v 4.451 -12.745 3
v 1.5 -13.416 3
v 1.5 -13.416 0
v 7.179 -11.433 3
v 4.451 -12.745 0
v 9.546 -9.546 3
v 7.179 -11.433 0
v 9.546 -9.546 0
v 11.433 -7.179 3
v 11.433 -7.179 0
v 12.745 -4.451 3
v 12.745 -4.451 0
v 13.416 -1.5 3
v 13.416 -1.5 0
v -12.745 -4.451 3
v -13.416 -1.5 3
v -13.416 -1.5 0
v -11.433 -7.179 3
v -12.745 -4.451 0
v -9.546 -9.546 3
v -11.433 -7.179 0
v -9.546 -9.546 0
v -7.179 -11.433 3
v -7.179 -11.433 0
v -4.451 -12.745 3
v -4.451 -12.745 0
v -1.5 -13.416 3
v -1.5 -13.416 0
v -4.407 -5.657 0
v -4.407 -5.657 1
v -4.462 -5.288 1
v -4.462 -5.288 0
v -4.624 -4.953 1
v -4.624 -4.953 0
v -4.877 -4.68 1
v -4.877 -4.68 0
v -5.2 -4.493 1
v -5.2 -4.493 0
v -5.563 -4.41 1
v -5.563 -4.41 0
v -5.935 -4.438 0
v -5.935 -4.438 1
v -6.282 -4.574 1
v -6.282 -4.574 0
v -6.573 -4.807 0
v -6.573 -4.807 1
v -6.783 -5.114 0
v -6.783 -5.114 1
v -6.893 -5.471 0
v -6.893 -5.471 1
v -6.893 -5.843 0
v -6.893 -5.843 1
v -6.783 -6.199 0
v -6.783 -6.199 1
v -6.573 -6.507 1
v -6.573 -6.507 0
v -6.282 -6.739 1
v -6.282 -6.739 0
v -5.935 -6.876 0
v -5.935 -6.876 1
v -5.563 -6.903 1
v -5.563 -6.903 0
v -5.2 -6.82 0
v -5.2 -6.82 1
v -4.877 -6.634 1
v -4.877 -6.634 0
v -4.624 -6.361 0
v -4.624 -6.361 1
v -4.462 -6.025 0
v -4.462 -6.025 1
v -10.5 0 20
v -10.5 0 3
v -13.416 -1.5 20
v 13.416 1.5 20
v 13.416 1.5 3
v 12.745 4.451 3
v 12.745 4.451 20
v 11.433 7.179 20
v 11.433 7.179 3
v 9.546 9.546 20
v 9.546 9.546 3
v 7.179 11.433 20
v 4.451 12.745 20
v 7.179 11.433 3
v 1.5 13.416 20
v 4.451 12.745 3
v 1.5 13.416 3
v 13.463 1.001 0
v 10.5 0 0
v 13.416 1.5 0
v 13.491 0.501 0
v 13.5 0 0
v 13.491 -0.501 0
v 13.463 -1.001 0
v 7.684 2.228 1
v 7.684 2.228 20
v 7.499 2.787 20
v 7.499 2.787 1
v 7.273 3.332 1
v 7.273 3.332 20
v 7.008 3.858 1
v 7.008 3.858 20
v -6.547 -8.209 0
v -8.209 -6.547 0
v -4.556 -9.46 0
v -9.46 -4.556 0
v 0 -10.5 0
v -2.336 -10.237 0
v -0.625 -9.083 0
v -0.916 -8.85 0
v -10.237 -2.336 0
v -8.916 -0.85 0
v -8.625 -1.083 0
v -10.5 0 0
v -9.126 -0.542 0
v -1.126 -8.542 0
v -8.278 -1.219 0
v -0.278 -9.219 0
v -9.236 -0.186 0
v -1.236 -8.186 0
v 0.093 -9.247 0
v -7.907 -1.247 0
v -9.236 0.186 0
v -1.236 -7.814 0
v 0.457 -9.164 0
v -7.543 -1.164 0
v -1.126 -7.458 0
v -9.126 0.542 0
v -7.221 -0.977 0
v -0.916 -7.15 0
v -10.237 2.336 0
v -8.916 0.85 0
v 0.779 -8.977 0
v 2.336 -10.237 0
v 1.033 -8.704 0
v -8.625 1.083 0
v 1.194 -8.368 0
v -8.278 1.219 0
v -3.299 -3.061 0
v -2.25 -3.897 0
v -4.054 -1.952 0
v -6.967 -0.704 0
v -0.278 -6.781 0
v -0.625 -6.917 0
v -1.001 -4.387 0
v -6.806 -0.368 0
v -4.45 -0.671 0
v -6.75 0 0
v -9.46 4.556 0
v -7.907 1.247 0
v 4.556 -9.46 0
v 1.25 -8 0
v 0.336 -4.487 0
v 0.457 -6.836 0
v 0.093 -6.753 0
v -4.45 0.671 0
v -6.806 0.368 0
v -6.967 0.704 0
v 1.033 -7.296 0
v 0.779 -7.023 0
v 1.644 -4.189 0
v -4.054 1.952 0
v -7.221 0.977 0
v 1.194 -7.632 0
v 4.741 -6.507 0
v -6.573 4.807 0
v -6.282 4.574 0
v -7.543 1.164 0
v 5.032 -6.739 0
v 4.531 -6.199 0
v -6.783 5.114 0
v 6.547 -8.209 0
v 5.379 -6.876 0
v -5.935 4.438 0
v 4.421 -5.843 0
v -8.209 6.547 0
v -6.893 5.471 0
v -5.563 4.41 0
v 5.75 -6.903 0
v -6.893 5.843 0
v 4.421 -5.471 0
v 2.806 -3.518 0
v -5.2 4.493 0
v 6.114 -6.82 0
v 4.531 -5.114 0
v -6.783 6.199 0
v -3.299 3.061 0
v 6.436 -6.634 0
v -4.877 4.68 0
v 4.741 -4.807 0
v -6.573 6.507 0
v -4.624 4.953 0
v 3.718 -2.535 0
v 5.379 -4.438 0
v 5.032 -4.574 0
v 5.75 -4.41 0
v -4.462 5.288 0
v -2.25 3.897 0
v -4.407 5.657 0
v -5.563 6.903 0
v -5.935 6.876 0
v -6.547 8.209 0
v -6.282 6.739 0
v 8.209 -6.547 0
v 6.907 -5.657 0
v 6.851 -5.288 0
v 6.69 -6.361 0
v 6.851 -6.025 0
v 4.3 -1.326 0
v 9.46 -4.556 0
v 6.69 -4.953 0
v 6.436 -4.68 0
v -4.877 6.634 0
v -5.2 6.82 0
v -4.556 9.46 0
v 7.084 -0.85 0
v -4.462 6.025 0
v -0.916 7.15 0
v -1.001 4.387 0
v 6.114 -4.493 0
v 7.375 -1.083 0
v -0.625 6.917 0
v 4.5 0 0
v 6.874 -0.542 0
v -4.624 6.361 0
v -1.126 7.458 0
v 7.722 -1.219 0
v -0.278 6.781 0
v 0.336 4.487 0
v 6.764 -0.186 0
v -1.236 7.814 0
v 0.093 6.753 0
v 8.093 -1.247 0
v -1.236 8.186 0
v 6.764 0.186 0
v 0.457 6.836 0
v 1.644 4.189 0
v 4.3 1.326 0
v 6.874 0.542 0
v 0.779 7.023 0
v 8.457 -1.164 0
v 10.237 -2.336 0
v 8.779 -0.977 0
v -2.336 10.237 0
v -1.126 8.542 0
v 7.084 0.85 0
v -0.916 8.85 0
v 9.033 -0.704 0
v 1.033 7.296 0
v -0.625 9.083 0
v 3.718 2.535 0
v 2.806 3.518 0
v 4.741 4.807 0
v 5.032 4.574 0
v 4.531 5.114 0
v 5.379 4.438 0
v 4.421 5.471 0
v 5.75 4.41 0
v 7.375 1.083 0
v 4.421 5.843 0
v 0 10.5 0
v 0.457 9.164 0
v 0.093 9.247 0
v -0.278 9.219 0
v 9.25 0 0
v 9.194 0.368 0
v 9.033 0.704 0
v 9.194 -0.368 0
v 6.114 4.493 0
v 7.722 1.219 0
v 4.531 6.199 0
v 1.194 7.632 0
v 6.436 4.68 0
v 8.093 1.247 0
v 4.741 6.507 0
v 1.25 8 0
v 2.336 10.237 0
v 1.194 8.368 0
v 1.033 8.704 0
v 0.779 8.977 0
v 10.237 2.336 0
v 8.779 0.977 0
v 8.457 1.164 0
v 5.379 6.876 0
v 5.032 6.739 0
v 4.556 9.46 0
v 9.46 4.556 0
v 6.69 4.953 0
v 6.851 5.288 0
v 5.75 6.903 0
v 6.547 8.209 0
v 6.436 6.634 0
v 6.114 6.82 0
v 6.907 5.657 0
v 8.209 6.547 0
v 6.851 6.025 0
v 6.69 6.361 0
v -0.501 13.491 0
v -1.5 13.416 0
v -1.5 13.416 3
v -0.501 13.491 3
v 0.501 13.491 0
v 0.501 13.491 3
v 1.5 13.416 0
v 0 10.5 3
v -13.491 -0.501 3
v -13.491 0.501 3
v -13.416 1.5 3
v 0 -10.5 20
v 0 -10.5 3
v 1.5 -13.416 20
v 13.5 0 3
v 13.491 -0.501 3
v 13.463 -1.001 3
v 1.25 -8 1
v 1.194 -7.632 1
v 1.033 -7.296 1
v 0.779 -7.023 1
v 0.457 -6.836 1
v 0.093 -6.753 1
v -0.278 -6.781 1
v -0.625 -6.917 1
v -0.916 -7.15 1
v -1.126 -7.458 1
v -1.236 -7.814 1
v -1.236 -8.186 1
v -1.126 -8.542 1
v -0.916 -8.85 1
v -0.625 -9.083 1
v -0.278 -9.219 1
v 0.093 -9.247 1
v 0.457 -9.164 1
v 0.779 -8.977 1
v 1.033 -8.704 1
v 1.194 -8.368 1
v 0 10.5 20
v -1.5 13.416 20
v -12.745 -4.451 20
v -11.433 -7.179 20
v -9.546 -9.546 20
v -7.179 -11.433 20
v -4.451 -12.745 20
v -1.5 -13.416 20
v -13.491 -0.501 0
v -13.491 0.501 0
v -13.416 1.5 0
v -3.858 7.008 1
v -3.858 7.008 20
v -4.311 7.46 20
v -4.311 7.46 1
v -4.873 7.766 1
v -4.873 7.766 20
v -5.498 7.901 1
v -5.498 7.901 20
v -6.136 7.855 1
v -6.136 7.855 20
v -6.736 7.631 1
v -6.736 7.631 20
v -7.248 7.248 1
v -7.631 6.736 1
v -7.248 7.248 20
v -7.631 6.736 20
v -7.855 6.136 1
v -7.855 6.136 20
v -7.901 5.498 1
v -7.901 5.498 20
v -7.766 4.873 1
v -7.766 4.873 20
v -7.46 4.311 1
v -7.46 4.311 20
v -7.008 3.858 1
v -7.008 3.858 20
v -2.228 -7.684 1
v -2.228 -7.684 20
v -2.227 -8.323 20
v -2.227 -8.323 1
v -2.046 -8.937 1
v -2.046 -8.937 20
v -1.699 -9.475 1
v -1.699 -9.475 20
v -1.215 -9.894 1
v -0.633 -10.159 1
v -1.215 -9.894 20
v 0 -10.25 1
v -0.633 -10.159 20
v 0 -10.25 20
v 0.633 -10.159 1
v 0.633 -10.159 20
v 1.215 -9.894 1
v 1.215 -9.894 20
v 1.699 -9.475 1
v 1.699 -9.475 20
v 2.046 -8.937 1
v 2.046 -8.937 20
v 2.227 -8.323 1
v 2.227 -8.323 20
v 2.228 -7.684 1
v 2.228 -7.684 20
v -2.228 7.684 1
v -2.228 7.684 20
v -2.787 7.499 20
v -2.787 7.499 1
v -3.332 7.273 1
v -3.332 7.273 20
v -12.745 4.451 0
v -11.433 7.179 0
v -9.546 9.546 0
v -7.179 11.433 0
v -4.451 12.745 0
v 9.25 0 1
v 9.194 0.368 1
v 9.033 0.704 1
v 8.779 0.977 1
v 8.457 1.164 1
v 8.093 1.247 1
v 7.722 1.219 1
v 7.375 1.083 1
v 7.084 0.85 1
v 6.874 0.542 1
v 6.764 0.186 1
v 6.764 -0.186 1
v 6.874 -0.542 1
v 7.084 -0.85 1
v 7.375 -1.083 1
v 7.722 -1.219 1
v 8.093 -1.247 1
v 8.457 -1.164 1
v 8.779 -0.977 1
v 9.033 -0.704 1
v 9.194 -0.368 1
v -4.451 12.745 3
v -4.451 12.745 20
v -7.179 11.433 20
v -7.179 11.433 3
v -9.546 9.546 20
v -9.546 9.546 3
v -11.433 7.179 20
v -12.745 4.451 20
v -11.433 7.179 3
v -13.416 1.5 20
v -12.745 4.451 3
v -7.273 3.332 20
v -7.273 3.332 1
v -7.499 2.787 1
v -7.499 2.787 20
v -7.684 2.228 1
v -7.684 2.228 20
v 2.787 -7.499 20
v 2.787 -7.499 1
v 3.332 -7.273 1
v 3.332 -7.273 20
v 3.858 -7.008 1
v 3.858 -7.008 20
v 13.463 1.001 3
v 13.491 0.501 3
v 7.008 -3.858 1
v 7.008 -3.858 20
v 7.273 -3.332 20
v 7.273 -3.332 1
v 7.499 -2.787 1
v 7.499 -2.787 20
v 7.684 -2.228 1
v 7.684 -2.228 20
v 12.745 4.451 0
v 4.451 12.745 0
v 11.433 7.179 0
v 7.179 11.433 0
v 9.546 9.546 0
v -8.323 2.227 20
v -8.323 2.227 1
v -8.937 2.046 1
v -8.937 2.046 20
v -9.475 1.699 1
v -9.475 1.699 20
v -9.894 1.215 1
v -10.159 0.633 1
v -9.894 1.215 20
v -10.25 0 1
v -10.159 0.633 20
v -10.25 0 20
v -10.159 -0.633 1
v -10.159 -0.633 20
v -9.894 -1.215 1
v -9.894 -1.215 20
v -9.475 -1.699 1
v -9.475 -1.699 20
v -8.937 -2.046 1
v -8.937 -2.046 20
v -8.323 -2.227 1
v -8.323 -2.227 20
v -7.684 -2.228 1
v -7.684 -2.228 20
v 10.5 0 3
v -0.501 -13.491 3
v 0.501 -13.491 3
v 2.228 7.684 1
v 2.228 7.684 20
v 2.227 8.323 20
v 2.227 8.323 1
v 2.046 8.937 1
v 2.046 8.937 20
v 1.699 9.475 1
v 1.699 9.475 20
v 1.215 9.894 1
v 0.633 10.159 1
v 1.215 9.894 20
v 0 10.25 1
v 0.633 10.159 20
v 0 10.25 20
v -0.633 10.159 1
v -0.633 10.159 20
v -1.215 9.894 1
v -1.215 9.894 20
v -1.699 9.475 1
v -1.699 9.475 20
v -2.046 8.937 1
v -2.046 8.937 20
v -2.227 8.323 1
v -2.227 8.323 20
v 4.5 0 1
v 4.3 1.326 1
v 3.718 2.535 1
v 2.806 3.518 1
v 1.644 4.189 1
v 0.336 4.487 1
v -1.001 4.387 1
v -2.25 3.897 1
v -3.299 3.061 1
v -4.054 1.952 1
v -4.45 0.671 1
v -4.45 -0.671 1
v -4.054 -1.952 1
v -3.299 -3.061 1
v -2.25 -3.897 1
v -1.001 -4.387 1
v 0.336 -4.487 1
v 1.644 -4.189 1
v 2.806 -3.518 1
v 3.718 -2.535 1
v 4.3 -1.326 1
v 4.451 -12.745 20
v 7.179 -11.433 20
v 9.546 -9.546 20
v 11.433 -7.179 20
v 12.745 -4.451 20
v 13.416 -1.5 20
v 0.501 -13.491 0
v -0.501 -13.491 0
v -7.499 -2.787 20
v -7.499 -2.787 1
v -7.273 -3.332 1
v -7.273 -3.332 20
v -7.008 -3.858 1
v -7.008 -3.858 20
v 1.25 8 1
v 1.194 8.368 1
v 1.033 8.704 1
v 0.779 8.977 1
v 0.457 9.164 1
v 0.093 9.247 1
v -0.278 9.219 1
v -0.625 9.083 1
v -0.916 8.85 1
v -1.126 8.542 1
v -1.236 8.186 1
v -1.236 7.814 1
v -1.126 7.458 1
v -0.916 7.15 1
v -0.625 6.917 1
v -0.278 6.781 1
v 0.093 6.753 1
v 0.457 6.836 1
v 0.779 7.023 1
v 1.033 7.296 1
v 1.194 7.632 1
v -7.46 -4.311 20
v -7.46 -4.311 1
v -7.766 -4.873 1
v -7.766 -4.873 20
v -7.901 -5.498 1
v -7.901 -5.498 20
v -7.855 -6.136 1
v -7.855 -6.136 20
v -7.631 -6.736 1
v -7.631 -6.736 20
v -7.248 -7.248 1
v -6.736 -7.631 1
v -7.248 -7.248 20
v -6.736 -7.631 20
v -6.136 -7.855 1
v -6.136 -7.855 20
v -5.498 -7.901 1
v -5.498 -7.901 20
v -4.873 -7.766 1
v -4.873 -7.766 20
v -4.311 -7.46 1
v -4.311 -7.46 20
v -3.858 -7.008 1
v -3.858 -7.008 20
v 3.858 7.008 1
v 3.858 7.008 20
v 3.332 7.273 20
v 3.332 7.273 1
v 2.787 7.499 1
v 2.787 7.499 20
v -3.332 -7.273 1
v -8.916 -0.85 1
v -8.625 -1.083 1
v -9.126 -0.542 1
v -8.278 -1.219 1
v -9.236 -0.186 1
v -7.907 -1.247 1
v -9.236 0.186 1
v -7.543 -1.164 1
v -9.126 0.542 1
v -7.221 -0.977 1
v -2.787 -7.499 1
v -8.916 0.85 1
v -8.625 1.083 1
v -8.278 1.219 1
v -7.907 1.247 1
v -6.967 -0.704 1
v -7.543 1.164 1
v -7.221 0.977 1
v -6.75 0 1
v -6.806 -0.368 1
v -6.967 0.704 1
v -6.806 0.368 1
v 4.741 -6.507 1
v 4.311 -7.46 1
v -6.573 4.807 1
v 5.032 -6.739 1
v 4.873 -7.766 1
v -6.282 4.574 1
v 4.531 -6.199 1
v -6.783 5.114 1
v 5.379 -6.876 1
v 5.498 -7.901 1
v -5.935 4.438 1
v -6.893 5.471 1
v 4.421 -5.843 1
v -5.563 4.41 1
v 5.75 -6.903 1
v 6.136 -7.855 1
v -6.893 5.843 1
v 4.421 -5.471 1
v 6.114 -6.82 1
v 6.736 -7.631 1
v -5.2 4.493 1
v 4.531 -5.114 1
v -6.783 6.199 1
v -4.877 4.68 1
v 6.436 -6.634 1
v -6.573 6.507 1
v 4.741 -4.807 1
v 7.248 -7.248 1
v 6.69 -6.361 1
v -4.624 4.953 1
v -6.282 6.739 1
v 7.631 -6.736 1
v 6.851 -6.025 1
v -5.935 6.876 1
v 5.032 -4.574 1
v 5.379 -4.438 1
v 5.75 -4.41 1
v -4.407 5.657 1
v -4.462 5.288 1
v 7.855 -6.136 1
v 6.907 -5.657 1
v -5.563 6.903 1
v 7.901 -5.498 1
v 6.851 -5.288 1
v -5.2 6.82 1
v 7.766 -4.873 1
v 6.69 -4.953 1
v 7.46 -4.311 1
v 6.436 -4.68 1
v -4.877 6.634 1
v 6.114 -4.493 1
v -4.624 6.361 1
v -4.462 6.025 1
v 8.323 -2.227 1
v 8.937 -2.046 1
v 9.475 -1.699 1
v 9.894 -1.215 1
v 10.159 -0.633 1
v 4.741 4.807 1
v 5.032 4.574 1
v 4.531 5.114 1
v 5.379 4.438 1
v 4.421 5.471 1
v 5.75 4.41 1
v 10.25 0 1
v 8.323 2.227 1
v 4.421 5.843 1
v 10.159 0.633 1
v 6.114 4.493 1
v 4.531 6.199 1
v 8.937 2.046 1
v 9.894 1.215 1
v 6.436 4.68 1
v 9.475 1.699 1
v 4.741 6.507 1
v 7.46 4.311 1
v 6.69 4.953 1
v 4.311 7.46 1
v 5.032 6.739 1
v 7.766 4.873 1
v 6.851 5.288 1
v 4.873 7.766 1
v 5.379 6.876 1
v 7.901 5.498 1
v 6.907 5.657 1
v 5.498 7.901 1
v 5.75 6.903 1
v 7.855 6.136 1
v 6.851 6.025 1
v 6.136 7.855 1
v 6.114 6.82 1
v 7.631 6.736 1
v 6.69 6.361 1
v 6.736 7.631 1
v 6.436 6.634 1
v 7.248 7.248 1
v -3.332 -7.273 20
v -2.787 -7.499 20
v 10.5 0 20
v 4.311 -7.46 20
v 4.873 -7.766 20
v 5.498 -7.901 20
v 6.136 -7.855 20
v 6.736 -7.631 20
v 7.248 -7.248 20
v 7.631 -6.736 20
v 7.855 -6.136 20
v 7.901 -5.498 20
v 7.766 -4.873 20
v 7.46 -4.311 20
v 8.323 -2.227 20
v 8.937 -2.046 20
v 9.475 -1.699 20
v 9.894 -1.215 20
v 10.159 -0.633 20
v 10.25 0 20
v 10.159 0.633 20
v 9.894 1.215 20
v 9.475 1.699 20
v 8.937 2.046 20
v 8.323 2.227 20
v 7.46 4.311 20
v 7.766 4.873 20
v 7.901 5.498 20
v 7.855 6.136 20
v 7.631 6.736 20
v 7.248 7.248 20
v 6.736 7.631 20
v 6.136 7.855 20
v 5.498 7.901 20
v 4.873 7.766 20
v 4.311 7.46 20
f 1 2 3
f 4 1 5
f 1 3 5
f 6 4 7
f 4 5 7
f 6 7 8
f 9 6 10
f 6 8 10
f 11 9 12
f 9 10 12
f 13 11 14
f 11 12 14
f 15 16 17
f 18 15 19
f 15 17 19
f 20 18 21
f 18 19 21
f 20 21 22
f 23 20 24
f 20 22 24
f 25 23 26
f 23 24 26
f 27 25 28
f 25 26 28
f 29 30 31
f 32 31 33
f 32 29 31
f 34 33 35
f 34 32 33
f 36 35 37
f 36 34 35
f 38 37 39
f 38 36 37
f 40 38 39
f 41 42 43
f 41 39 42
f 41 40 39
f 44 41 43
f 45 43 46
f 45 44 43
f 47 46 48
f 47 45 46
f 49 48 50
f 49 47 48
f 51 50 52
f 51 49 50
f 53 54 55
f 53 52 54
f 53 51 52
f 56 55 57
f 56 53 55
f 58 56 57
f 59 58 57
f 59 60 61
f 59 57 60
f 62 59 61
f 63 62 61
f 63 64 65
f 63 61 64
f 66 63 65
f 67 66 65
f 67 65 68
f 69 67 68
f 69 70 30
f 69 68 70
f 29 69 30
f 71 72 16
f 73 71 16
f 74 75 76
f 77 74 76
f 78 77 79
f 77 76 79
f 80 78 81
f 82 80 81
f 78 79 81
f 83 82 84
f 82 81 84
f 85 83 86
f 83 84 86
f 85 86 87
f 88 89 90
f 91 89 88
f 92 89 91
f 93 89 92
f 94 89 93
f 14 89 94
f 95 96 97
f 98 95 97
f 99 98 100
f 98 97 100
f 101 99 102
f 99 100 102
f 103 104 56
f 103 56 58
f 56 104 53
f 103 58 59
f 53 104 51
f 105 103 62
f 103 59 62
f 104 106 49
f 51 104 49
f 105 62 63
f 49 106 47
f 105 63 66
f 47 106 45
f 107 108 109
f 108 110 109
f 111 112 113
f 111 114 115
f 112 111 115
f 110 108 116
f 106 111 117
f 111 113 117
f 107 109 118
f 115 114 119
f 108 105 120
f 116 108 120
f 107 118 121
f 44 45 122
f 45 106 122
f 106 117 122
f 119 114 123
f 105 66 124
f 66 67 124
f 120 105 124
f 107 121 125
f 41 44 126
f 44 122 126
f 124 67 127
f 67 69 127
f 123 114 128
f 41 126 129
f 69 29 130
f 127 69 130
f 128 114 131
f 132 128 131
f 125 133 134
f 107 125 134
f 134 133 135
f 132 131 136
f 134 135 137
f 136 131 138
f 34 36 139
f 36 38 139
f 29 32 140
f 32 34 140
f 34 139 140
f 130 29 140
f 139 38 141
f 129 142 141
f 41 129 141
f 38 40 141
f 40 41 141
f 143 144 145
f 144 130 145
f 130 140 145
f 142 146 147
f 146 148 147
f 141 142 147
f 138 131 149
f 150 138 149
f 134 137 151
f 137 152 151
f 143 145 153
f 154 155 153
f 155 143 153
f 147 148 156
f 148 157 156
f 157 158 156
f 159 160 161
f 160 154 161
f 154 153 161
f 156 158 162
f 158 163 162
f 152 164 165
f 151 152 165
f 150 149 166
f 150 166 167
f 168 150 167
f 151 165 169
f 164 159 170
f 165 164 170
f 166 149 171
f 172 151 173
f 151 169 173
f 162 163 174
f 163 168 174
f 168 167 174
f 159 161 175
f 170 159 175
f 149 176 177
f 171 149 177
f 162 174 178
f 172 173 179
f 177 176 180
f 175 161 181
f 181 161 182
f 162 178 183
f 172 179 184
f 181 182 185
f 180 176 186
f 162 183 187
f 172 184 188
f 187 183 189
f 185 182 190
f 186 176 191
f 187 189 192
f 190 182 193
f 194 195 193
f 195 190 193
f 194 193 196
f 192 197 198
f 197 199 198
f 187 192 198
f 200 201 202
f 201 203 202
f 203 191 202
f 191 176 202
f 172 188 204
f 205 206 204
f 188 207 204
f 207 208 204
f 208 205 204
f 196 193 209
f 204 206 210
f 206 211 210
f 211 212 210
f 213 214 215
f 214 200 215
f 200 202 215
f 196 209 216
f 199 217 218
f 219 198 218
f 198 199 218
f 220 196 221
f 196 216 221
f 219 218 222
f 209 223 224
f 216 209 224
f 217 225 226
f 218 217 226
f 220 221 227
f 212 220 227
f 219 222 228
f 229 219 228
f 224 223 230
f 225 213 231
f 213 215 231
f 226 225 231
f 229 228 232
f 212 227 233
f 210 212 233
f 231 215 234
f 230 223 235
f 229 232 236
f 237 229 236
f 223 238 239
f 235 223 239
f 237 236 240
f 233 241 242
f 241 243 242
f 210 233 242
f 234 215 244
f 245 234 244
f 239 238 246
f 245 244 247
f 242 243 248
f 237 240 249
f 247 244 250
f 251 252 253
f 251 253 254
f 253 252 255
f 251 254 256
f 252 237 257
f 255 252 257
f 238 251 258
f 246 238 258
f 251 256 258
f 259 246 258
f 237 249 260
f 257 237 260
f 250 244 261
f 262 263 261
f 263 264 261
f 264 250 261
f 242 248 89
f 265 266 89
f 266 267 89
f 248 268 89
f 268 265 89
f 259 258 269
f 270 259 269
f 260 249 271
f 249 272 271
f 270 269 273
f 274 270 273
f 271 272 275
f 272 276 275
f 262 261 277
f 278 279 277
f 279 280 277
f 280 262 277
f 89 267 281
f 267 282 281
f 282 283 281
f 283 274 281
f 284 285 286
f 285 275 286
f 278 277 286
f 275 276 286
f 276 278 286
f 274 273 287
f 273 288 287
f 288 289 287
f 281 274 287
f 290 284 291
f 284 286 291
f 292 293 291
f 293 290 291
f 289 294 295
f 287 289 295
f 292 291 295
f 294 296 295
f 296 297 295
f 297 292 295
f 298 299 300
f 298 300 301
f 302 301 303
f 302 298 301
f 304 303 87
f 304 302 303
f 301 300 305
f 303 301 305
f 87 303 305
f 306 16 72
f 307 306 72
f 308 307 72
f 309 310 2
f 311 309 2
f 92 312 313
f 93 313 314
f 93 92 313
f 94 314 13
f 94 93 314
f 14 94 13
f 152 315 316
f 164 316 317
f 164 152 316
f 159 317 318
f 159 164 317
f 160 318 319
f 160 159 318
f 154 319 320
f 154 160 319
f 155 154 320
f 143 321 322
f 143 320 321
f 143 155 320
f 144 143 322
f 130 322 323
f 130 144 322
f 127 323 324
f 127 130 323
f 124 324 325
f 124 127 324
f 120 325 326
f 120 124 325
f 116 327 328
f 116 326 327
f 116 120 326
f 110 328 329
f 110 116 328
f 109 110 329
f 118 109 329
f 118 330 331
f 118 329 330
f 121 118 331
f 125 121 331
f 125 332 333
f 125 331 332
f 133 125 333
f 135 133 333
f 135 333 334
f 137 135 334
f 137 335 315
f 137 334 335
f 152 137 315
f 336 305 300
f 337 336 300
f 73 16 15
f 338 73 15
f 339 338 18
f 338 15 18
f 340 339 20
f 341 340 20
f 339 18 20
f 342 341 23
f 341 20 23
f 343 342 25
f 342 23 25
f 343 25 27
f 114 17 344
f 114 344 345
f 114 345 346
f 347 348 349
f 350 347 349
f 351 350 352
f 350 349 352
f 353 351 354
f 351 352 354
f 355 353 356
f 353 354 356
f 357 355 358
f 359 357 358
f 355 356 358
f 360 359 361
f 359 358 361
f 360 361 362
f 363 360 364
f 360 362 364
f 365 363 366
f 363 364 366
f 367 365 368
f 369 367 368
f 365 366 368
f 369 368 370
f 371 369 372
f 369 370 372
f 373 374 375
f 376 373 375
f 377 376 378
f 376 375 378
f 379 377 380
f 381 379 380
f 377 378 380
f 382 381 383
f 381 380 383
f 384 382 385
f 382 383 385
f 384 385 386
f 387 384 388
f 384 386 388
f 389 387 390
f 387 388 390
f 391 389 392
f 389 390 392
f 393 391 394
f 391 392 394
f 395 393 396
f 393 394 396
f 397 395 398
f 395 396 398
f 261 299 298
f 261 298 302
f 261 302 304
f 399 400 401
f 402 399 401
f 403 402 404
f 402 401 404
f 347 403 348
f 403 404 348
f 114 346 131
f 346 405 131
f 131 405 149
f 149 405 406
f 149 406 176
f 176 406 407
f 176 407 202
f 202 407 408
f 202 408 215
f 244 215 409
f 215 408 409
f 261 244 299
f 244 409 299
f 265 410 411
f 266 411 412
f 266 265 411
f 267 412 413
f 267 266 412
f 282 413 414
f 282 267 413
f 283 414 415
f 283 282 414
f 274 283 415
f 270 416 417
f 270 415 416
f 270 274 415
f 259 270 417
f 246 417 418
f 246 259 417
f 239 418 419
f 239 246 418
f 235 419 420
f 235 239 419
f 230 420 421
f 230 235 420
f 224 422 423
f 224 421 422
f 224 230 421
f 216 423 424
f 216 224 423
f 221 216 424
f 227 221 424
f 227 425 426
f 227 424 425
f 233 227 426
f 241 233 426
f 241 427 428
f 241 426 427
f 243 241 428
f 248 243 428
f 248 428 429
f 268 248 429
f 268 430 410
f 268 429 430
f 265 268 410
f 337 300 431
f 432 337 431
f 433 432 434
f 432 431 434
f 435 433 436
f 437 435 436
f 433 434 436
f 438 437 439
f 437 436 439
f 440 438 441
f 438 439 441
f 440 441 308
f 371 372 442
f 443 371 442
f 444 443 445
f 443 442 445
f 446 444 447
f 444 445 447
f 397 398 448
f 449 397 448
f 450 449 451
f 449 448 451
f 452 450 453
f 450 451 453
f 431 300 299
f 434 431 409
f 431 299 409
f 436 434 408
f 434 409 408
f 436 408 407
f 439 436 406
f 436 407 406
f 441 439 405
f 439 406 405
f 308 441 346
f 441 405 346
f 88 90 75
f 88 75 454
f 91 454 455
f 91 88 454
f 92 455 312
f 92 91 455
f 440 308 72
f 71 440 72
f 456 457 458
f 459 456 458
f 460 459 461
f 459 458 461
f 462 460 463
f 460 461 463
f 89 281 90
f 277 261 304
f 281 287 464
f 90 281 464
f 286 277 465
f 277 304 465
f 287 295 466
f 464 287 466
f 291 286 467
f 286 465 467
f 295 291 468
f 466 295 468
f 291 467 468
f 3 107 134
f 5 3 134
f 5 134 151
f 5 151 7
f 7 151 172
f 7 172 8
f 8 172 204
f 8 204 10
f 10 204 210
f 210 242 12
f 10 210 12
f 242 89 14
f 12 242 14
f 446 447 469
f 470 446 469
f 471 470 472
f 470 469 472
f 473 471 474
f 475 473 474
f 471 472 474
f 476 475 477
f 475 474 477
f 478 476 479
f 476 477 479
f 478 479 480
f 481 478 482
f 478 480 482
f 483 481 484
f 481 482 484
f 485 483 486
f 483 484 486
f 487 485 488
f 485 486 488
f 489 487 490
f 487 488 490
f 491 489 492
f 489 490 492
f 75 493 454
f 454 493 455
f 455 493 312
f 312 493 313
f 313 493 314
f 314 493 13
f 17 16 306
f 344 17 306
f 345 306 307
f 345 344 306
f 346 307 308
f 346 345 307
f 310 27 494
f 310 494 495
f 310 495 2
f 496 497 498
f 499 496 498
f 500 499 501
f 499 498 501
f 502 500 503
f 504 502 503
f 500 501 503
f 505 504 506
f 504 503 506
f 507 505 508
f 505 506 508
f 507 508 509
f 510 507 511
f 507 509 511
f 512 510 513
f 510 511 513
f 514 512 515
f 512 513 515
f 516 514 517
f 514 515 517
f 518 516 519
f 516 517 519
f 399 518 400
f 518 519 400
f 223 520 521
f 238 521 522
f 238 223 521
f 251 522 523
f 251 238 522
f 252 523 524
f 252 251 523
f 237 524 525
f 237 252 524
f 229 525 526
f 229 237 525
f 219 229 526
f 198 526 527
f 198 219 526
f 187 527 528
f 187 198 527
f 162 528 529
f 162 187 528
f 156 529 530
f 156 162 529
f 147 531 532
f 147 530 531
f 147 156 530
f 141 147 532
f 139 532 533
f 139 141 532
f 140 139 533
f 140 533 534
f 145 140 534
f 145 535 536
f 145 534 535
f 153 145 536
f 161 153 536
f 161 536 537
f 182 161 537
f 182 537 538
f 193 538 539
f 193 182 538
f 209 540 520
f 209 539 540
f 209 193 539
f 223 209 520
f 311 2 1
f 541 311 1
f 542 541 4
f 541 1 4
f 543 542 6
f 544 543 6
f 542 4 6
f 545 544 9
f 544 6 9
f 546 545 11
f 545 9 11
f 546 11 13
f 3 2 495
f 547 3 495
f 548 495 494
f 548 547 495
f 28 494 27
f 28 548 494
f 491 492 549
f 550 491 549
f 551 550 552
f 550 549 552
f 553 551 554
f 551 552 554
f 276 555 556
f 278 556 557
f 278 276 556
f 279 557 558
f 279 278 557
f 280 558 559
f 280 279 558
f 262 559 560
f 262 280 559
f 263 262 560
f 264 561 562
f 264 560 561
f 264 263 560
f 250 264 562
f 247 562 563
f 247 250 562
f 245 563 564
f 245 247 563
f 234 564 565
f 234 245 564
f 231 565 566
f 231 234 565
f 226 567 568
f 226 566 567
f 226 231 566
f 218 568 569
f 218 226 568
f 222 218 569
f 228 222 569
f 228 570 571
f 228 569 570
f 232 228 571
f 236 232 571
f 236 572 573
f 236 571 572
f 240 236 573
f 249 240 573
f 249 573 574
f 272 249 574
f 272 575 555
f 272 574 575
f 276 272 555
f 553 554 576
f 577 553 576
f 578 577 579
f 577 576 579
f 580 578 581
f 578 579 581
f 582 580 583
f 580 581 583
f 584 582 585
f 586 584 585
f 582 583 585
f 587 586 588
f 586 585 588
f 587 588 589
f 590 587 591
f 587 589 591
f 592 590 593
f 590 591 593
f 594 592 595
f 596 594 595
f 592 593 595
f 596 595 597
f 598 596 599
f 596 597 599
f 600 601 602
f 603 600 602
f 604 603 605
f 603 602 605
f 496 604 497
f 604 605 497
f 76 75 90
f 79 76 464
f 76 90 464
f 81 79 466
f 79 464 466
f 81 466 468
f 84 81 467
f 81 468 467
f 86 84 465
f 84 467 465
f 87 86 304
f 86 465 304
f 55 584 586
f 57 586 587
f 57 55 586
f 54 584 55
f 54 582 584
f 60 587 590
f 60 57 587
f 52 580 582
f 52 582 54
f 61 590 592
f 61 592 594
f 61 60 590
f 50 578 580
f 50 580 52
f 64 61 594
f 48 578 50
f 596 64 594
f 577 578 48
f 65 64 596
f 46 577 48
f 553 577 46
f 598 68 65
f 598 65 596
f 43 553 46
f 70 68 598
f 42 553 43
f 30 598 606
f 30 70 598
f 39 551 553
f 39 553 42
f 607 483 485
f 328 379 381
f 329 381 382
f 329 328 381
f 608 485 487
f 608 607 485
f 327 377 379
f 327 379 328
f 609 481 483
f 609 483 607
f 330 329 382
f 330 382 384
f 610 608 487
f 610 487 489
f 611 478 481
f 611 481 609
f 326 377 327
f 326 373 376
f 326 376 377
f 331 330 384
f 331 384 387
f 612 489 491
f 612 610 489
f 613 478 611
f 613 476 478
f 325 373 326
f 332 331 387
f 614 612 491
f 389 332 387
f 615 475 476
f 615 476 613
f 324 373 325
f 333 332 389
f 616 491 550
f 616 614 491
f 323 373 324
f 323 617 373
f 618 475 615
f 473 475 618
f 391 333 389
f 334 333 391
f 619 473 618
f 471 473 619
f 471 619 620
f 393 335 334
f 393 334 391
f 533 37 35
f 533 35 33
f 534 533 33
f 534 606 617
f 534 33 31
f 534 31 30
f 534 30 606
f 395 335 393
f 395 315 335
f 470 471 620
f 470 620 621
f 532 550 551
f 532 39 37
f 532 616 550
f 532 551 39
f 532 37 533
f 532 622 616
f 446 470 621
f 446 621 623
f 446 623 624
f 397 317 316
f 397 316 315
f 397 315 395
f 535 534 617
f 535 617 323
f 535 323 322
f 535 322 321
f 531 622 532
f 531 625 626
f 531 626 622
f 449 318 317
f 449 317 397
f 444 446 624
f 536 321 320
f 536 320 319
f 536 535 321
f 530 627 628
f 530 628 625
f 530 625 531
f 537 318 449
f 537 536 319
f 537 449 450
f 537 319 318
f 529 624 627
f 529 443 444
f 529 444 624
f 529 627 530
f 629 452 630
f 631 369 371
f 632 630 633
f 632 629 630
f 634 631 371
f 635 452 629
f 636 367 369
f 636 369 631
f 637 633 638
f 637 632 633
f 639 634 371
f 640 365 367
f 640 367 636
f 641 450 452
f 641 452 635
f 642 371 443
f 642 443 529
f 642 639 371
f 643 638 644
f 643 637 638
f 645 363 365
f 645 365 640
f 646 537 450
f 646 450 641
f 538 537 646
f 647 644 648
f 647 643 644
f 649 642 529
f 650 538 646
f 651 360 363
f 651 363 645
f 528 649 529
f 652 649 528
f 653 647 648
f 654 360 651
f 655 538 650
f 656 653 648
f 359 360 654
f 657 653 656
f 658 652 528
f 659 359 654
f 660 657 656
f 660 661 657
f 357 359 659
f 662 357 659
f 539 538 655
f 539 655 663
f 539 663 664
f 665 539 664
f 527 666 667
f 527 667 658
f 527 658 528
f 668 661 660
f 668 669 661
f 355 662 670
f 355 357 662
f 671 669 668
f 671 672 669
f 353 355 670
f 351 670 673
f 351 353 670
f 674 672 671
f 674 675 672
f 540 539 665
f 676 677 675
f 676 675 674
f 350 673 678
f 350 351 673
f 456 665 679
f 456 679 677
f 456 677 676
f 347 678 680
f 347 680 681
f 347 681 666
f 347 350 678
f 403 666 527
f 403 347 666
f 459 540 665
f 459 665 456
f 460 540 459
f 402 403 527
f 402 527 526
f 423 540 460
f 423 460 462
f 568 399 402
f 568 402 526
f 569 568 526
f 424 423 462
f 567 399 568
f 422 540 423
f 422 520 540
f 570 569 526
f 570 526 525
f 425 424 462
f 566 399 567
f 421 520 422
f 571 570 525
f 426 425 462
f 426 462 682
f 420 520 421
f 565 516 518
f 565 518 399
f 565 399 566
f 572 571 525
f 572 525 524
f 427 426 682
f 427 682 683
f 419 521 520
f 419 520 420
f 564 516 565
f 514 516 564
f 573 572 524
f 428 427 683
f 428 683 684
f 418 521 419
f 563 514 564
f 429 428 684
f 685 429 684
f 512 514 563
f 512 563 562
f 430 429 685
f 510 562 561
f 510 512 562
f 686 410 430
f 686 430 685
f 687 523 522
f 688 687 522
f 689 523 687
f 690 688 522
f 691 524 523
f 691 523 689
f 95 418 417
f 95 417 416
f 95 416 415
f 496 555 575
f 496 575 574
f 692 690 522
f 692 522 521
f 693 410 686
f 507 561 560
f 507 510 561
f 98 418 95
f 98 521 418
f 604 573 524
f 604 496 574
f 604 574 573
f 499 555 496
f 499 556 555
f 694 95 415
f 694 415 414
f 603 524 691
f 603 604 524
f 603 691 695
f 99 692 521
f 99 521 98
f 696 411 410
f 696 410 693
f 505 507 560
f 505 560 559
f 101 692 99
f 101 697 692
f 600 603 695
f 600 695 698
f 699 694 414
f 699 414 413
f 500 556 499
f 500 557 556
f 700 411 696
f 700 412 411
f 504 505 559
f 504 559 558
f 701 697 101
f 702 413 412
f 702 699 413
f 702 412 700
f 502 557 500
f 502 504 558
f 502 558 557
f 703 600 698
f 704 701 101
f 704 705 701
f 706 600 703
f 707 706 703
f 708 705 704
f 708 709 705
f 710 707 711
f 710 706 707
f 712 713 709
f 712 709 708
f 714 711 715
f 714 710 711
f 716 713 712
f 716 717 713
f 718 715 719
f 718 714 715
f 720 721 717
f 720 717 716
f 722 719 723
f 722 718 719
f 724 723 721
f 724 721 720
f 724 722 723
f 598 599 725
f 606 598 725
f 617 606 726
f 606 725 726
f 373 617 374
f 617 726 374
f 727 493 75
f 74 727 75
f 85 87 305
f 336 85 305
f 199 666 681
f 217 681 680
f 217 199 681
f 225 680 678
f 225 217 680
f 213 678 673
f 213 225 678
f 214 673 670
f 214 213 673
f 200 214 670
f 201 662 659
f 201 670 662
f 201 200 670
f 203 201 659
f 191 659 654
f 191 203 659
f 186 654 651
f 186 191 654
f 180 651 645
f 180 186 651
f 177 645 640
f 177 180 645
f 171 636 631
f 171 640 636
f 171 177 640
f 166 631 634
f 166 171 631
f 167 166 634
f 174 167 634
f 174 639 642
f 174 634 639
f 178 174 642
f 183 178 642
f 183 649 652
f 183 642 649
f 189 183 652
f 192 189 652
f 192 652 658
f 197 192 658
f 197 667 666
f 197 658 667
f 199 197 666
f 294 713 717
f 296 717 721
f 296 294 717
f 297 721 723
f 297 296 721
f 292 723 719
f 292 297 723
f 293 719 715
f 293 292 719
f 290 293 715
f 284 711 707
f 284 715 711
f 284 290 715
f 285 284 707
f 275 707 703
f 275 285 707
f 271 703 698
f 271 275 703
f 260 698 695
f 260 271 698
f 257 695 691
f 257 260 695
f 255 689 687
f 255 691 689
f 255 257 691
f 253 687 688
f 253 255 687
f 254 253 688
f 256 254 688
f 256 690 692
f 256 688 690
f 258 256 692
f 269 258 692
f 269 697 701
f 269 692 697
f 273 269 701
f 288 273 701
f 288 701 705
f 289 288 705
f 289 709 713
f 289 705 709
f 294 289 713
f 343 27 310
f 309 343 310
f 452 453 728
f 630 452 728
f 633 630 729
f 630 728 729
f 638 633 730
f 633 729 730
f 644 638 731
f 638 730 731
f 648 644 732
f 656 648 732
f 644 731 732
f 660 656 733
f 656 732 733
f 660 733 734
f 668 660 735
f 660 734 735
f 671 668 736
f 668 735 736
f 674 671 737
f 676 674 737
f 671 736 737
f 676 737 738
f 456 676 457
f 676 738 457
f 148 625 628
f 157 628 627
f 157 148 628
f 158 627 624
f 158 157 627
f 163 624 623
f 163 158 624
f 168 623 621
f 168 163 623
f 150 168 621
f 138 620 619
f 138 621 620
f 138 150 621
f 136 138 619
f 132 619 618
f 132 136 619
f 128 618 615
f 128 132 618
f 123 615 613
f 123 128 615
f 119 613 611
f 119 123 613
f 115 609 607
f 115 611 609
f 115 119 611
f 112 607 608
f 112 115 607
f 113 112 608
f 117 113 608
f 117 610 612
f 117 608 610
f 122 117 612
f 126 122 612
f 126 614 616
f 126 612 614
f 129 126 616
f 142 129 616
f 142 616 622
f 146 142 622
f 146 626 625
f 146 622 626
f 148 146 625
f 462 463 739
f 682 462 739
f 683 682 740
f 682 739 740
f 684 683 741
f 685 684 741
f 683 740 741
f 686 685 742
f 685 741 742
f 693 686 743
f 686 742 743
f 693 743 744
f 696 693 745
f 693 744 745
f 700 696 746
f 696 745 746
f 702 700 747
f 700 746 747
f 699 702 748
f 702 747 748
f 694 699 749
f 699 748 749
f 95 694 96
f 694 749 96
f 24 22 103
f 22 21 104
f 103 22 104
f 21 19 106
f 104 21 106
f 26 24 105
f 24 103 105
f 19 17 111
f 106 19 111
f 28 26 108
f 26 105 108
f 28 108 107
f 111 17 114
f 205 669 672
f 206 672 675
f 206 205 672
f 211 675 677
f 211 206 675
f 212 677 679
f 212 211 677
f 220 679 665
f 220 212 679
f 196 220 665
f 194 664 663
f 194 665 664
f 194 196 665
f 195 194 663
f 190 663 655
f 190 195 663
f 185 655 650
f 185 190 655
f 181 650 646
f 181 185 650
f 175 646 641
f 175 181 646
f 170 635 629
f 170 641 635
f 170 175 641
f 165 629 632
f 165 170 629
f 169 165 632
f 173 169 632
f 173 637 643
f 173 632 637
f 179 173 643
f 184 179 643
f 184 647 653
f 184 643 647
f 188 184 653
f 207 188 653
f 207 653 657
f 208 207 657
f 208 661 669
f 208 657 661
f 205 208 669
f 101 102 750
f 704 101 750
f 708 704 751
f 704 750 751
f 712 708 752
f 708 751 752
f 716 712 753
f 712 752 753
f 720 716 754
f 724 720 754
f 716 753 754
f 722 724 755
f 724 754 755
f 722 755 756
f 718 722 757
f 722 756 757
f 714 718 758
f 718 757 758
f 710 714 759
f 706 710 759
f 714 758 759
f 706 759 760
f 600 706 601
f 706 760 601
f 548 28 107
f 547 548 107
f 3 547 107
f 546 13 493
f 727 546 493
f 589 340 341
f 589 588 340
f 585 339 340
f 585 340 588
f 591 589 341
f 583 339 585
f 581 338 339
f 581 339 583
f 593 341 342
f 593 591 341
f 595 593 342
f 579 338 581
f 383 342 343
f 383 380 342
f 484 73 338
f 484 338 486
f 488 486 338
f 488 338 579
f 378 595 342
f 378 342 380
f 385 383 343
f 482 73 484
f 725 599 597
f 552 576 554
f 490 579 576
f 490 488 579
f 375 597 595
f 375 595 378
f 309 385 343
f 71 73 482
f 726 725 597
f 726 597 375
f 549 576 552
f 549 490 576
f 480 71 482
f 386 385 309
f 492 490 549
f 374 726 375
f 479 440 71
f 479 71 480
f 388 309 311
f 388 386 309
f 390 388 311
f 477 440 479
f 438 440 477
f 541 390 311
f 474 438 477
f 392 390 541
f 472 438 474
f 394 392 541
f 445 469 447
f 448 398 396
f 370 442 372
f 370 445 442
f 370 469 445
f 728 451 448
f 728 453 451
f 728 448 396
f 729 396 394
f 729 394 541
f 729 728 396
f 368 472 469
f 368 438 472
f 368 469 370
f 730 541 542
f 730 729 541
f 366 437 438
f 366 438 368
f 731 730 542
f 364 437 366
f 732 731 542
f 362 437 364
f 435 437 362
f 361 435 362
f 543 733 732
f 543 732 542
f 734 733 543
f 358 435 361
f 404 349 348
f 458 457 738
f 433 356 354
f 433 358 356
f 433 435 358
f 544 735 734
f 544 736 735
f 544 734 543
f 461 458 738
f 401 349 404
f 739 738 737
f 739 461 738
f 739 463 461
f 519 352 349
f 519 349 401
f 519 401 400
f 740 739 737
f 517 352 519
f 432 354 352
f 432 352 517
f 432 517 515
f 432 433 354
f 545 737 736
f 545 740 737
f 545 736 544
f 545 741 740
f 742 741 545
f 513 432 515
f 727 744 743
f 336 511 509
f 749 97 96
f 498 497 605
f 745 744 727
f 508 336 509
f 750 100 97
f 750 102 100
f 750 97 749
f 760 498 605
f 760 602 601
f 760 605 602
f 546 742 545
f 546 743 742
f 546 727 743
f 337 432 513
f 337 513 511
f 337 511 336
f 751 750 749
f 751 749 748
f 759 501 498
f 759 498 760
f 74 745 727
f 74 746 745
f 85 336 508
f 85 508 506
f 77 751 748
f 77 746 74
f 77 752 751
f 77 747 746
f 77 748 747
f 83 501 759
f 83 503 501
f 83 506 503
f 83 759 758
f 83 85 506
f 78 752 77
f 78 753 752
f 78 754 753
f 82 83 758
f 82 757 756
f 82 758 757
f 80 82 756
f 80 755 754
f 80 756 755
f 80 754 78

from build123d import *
from build123d import SkipClean  # not in build123d's __all__

# Parameters (mm, degrees)
F0_R     = 1.25
F0_R_2   = 4.5
F1_DEPTH = 20
F3_DEPTH = 19
F4_R     = 13.5
F4_R_2   = 10.5
F5_DEPTH = 3


with BuildPart() as f1:
    # F0 (on Top) → F1 (new body)
    with BuildSketch(Plane.XY):
        with BuildLine():
            Line((-10.5, 0), (-13.416407865, -1.5))
            ThreePointArc((-13.416407865, -1.5), (-9.545941546, -9.545941546), (-1.5, -13.416407865))
            Line((-1.5, -13.416407865), (0, -10.5))
            Line((0, -10.5), (1.5, -13.416407865))
            ThreePointArc((1.5, -13.416407865), (9.545941546, -9.545941546), (13.416407865, -1.5))
            Line((13.416407865, -1.5), (10.5, 0))
            Line((10.5, 0), (13.416407865, 1.5))
            ThreePointArc((13.416407865, 1.5), (9.545941546, 9.545941546), (1.5, 13.416407865))
            Line((1.5, 13.416407865), (0, 10.5))
            Line((0, 10.5), (-1.5, 13.416407865))
            ThreePointArc((-1.5, 13.416407865), (-9.545941546, 9.545941546), (-13.416407865, 1.5))
            Line((-13.416407865, 1.5), (-10.5, 0))
        make_face()
        with Locations((-5.6568542495, -5.6568542495)):
            Circle(F0_R, mode=Mode.SUBTRACT)
        with Locations((0, -8)):
            Circle(F0_R, mode=Mode.SUBTRACT)
        with Locations((5.6568542495, -5.6568542495)):
            Circle(F0_R, mode=Mode.SUBTRACT)
        with Locations((-8, 0)):
            Circle(F0_R, mode=Mode.SUBTRACT)
        with Locations((-5.6568542495, 5.6568542495)):
            Circle(F0_R, mode=Mode.SUBTRACT)
        Circle(F0_R_2, mode=Mode.SUBTRACT)
        with Locations((5.6568542495, 5.6568542495)):
            Circle(F0_R, mode=Mode.SUBTRACT)
        with Locations((8, 0)):
            Circle(F0_R, mode=Mode.SUBTRACT)
        with Locations((0, 8)):
            Circle(F0_R, mode=Mode.SUBTRACT)
    extrude(amount=F1_DEPTH)

    # F2 (on face) → F3 (cut)
    with BuildSketch(Plane.XY.offset(20)):
        with BuildLine():
            ThreePointArc((-7.0083017238, 3.8579407652), (-7.3910362601, 3.0614674589), (-7.68359375, 2.2276415971))
            ThreePointArc((-7.68359375, 2.2276415971), (-10.25, 0), (-7.68359375, -2.2276415971))
            ThreePointArc((-7.68359375, -2.2276415971), (-7.3910362601, -3.0614674589), (-7.0083017238, -3.8579407652))
            ThreePointArc((-7.0083017238, -3.8579407652), (-7.2478445072, -7.2478445072), (-3.8579407652, -7.0083017238))
            ThreePointArc((-3.8579407652, -7.0083017238), (-3.0614674589, -7.3910362601), (-2.2276415971, -7.68359375))
            ThreePointArc((-2.2276415971, -7.68359375), (0, -10.25), (2.2276415971, -7.68359375))
            ThreePointArc((2.2276415971, -7.68359375), (3.0614674589, -7.3910362601), (3.8579407652, -7.0083017238))
            ThreePointArc((3.8579407652, -7.0083017238), (7.2478445072, -7.2478445072), (7.0083017238, -3.8579407652))
            ThreePointArc((7.0083017238, -3.8579407652), (7.3910362601, -3.0614674589), (7.68359375, -2.2276415971))
            ThreePointArc((7.68359375, -2.2276415971), (10.25, 0), (7.68359375, 2.2276415971))
            ThreePointArc((7.68359375, 2.2276415971), (7.3910362601, 3.0614674589), (7.0083017238, 3.8579407652))
            ThreePointArc((7.0083017238, 3.8579407652), (7.2478445072, 7.2478445072), (3.8579407652, 7.0083017238))
            ThreePointArc((3.8579407652, 7.0083017238), (3.0614674589, 7.3910362601), (2.2276415971, 7.68359375))
            ThreePointArc((2.2276415971, 7.68359375), (0, 10.25), (-2.2276415971, 7.68359375))
            ThreePointArc((-2.2276415971, 7.68359375), (-3.0614674589, 7.3910362601), (-3.8579407652, 7.0083017238))
            ThreePointArc((-3.8579407652, 7.0083017238), (-7.2478445072, 7.2478445072), (-7.0083017238, 3.8579407652))
        make_face()
    extrude(amount=-F3_DEPTH, mode=Mode.SUBTRACT)

    # F4 (on face) → F5 (join)
    with BuildSketch(Plane(origin=(0, 0, 0), x_dir=(1, 0, 0), z_dir=(0, 0, -1))):
        Circle(F4_R)
        Circle(F4_R_2, mode=Mode.SUBTRACT)
    with SkipClean():  # cleaning this boolean's faces spoils the solid; the shape is the same uncleaned
        extrude(amount=-F5_DEPTH)


solid = f1.part
